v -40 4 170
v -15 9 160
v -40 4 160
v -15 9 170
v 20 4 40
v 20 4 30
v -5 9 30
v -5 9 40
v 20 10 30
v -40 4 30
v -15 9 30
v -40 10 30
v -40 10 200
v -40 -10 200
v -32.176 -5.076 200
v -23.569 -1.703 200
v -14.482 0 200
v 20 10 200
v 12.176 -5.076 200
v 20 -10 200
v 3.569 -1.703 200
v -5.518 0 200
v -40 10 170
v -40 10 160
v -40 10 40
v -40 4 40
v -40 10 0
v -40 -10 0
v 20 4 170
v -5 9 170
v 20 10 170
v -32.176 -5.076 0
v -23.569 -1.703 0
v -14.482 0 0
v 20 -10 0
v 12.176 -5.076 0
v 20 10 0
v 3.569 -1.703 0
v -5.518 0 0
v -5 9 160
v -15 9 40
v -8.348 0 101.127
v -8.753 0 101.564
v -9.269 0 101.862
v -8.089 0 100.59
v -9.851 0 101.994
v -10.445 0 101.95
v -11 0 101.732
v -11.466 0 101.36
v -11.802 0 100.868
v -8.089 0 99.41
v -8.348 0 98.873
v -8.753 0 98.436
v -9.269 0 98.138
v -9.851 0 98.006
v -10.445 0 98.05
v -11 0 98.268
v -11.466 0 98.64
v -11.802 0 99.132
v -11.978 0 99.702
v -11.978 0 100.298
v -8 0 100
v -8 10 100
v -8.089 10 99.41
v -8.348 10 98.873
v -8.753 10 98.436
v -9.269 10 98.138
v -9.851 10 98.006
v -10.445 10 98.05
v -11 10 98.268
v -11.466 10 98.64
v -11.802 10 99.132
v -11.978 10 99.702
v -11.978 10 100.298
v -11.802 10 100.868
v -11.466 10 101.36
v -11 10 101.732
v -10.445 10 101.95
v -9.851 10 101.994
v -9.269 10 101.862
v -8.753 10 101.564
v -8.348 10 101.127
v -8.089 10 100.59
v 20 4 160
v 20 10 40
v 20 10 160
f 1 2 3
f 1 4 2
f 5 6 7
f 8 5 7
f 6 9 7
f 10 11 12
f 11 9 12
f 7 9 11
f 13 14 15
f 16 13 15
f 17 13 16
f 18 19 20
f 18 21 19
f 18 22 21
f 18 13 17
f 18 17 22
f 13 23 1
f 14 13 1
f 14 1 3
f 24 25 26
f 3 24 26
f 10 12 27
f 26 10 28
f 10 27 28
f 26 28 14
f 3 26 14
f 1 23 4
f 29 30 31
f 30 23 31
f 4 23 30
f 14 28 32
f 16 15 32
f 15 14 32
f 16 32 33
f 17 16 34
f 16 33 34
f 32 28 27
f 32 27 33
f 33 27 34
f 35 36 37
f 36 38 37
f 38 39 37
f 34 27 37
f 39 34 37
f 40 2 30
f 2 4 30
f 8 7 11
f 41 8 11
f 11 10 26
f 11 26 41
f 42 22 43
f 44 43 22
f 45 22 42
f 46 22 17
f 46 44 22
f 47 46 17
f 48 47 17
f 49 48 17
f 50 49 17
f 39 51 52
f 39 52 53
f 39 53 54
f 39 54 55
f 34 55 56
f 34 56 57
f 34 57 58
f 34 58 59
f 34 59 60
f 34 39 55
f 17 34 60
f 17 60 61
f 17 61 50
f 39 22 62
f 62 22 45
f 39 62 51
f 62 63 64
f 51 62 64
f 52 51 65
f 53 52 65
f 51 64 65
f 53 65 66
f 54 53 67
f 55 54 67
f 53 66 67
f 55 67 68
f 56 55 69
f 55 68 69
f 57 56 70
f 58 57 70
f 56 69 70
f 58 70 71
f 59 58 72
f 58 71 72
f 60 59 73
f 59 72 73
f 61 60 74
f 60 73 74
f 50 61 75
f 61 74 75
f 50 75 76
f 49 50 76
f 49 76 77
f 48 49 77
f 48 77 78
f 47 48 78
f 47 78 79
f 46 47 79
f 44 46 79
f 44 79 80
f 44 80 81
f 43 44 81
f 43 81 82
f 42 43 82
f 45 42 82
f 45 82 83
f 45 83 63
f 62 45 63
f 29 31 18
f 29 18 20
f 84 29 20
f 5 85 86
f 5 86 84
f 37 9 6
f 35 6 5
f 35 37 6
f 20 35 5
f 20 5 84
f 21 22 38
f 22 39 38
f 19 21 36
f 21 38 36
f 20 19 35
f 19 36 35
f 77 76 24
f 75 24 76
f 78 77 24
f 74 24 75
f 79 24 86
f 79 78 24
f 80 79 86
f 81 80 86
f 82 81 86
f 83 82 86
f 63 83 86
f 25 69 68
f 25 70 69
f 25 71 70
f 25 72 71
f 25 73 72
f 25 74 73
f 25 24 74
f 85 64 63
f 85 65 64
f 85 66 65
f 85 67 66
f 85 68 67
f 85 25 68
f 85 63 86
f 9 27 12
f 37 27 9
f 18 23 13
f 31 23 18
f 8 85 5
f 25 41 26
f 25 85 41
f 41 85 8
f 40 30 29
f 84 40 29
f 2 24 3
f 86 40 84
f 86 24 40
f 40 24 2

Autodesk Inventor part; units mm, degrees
ref_plane "YZ Plane" through (0, 0, 0) normal (1, 0, 0) x (0, 1, 0)
sketch "Sketch1" plane through (0, 0, 0) normal (0, 0, 1) x (1, 0, 0)
  line L0 (0, 0) -> (-20, 0)
  line L1 (-20, 0) -> (-20, 10)
  line L2 (-20, 10) -> (0, 10)
  line L3 (0, 10) -> (0, 0)
  line L4 (-10, 0) -> (24.641, 0) construction
  line L5 (-10, 0) -> (24.641, 0) construction
  line L6 (0, 10) -> (20, 10)
  line L7 (20, 10) -> (20, -10)
  line L8 (-20, 10) -> (-40, 10)
  line L9 (-40, 10) -> (-40, -10)
  arc A0 (20, -10) -> (-40, -10) centre (-10, -48.9954) ccw
  point P0 (-5.5176, 0)
  point P1 (-14.4824, 0)
  dimension "d0" = 20
  dimension "d1" = 10
  dimension "d8" = 30
  dimension "d10" = 30
  dimension "d15" = 20
  dimension "d16" = 20
extrude "Extrusion1" add sketch "Sketch1" along normal blind 200
sketch "Sketch4" plane through (-40, 10, 0) normal (0, 1, 0) x (1, 0, 0)
  line L0 (0, 0) -> (0, -200) projected
  line L1 (60, 0) -> (60, -200) projected
  line L2 (0, 0) -> (60, -200) construction
  circle A0 centre (30, -100) radius 2
  point P0 (40, 0)
  dimension "d17" = 4
extrude "Extrusion4" cut sketch "Sketch4" against normal through all
ref_plane "Work Plane1" through (0, 0, 170) normal (0, 0, 1) x (1, 0, 0)
sketch "Sketch5" plane through (0, 0, 200) normal (0, 0, 1) x (1, 0, 0)
  line L0 (20, 10) -> (-40, 10) projected
  line L1 (-10, 10) -> (-40, 4)
  line L2 (-10, 10) -> (-40, 10)
  line L3 (-40, 4) -> (-40, 10)
  line L4 (-10, 10) -> (-10, 14.555) construction
  line L5 (-40, 10) -> (20, 10)
  line L6 (-10, 10) -> (20, 4)
  line L7 (-10, 10) -> (20, 10)
  line L8 (20, 4) -> (20, 10)
  line L9 (-15, 9) -> (-5, 9)
  point P0 (0, 0)
  dimension "d21" = 6
  dimension "d24" = 1
extrude "Extrusion5" cut sketch "Sketch5" against normal blind 10 from surface at -30
ref_plane "Work Plane2" through (0, 0, 100) normal (0, 0, 1) x (1, 0, 0)
mirror "Mirror1" about plane through (0, 0, 100) normal (0, 0, 1) of "Extrusion5"
equation "\"d10\" = d8"
equation "\"d16\" = d15"
properties part number "legno 2" material "Wood (Birch)"
